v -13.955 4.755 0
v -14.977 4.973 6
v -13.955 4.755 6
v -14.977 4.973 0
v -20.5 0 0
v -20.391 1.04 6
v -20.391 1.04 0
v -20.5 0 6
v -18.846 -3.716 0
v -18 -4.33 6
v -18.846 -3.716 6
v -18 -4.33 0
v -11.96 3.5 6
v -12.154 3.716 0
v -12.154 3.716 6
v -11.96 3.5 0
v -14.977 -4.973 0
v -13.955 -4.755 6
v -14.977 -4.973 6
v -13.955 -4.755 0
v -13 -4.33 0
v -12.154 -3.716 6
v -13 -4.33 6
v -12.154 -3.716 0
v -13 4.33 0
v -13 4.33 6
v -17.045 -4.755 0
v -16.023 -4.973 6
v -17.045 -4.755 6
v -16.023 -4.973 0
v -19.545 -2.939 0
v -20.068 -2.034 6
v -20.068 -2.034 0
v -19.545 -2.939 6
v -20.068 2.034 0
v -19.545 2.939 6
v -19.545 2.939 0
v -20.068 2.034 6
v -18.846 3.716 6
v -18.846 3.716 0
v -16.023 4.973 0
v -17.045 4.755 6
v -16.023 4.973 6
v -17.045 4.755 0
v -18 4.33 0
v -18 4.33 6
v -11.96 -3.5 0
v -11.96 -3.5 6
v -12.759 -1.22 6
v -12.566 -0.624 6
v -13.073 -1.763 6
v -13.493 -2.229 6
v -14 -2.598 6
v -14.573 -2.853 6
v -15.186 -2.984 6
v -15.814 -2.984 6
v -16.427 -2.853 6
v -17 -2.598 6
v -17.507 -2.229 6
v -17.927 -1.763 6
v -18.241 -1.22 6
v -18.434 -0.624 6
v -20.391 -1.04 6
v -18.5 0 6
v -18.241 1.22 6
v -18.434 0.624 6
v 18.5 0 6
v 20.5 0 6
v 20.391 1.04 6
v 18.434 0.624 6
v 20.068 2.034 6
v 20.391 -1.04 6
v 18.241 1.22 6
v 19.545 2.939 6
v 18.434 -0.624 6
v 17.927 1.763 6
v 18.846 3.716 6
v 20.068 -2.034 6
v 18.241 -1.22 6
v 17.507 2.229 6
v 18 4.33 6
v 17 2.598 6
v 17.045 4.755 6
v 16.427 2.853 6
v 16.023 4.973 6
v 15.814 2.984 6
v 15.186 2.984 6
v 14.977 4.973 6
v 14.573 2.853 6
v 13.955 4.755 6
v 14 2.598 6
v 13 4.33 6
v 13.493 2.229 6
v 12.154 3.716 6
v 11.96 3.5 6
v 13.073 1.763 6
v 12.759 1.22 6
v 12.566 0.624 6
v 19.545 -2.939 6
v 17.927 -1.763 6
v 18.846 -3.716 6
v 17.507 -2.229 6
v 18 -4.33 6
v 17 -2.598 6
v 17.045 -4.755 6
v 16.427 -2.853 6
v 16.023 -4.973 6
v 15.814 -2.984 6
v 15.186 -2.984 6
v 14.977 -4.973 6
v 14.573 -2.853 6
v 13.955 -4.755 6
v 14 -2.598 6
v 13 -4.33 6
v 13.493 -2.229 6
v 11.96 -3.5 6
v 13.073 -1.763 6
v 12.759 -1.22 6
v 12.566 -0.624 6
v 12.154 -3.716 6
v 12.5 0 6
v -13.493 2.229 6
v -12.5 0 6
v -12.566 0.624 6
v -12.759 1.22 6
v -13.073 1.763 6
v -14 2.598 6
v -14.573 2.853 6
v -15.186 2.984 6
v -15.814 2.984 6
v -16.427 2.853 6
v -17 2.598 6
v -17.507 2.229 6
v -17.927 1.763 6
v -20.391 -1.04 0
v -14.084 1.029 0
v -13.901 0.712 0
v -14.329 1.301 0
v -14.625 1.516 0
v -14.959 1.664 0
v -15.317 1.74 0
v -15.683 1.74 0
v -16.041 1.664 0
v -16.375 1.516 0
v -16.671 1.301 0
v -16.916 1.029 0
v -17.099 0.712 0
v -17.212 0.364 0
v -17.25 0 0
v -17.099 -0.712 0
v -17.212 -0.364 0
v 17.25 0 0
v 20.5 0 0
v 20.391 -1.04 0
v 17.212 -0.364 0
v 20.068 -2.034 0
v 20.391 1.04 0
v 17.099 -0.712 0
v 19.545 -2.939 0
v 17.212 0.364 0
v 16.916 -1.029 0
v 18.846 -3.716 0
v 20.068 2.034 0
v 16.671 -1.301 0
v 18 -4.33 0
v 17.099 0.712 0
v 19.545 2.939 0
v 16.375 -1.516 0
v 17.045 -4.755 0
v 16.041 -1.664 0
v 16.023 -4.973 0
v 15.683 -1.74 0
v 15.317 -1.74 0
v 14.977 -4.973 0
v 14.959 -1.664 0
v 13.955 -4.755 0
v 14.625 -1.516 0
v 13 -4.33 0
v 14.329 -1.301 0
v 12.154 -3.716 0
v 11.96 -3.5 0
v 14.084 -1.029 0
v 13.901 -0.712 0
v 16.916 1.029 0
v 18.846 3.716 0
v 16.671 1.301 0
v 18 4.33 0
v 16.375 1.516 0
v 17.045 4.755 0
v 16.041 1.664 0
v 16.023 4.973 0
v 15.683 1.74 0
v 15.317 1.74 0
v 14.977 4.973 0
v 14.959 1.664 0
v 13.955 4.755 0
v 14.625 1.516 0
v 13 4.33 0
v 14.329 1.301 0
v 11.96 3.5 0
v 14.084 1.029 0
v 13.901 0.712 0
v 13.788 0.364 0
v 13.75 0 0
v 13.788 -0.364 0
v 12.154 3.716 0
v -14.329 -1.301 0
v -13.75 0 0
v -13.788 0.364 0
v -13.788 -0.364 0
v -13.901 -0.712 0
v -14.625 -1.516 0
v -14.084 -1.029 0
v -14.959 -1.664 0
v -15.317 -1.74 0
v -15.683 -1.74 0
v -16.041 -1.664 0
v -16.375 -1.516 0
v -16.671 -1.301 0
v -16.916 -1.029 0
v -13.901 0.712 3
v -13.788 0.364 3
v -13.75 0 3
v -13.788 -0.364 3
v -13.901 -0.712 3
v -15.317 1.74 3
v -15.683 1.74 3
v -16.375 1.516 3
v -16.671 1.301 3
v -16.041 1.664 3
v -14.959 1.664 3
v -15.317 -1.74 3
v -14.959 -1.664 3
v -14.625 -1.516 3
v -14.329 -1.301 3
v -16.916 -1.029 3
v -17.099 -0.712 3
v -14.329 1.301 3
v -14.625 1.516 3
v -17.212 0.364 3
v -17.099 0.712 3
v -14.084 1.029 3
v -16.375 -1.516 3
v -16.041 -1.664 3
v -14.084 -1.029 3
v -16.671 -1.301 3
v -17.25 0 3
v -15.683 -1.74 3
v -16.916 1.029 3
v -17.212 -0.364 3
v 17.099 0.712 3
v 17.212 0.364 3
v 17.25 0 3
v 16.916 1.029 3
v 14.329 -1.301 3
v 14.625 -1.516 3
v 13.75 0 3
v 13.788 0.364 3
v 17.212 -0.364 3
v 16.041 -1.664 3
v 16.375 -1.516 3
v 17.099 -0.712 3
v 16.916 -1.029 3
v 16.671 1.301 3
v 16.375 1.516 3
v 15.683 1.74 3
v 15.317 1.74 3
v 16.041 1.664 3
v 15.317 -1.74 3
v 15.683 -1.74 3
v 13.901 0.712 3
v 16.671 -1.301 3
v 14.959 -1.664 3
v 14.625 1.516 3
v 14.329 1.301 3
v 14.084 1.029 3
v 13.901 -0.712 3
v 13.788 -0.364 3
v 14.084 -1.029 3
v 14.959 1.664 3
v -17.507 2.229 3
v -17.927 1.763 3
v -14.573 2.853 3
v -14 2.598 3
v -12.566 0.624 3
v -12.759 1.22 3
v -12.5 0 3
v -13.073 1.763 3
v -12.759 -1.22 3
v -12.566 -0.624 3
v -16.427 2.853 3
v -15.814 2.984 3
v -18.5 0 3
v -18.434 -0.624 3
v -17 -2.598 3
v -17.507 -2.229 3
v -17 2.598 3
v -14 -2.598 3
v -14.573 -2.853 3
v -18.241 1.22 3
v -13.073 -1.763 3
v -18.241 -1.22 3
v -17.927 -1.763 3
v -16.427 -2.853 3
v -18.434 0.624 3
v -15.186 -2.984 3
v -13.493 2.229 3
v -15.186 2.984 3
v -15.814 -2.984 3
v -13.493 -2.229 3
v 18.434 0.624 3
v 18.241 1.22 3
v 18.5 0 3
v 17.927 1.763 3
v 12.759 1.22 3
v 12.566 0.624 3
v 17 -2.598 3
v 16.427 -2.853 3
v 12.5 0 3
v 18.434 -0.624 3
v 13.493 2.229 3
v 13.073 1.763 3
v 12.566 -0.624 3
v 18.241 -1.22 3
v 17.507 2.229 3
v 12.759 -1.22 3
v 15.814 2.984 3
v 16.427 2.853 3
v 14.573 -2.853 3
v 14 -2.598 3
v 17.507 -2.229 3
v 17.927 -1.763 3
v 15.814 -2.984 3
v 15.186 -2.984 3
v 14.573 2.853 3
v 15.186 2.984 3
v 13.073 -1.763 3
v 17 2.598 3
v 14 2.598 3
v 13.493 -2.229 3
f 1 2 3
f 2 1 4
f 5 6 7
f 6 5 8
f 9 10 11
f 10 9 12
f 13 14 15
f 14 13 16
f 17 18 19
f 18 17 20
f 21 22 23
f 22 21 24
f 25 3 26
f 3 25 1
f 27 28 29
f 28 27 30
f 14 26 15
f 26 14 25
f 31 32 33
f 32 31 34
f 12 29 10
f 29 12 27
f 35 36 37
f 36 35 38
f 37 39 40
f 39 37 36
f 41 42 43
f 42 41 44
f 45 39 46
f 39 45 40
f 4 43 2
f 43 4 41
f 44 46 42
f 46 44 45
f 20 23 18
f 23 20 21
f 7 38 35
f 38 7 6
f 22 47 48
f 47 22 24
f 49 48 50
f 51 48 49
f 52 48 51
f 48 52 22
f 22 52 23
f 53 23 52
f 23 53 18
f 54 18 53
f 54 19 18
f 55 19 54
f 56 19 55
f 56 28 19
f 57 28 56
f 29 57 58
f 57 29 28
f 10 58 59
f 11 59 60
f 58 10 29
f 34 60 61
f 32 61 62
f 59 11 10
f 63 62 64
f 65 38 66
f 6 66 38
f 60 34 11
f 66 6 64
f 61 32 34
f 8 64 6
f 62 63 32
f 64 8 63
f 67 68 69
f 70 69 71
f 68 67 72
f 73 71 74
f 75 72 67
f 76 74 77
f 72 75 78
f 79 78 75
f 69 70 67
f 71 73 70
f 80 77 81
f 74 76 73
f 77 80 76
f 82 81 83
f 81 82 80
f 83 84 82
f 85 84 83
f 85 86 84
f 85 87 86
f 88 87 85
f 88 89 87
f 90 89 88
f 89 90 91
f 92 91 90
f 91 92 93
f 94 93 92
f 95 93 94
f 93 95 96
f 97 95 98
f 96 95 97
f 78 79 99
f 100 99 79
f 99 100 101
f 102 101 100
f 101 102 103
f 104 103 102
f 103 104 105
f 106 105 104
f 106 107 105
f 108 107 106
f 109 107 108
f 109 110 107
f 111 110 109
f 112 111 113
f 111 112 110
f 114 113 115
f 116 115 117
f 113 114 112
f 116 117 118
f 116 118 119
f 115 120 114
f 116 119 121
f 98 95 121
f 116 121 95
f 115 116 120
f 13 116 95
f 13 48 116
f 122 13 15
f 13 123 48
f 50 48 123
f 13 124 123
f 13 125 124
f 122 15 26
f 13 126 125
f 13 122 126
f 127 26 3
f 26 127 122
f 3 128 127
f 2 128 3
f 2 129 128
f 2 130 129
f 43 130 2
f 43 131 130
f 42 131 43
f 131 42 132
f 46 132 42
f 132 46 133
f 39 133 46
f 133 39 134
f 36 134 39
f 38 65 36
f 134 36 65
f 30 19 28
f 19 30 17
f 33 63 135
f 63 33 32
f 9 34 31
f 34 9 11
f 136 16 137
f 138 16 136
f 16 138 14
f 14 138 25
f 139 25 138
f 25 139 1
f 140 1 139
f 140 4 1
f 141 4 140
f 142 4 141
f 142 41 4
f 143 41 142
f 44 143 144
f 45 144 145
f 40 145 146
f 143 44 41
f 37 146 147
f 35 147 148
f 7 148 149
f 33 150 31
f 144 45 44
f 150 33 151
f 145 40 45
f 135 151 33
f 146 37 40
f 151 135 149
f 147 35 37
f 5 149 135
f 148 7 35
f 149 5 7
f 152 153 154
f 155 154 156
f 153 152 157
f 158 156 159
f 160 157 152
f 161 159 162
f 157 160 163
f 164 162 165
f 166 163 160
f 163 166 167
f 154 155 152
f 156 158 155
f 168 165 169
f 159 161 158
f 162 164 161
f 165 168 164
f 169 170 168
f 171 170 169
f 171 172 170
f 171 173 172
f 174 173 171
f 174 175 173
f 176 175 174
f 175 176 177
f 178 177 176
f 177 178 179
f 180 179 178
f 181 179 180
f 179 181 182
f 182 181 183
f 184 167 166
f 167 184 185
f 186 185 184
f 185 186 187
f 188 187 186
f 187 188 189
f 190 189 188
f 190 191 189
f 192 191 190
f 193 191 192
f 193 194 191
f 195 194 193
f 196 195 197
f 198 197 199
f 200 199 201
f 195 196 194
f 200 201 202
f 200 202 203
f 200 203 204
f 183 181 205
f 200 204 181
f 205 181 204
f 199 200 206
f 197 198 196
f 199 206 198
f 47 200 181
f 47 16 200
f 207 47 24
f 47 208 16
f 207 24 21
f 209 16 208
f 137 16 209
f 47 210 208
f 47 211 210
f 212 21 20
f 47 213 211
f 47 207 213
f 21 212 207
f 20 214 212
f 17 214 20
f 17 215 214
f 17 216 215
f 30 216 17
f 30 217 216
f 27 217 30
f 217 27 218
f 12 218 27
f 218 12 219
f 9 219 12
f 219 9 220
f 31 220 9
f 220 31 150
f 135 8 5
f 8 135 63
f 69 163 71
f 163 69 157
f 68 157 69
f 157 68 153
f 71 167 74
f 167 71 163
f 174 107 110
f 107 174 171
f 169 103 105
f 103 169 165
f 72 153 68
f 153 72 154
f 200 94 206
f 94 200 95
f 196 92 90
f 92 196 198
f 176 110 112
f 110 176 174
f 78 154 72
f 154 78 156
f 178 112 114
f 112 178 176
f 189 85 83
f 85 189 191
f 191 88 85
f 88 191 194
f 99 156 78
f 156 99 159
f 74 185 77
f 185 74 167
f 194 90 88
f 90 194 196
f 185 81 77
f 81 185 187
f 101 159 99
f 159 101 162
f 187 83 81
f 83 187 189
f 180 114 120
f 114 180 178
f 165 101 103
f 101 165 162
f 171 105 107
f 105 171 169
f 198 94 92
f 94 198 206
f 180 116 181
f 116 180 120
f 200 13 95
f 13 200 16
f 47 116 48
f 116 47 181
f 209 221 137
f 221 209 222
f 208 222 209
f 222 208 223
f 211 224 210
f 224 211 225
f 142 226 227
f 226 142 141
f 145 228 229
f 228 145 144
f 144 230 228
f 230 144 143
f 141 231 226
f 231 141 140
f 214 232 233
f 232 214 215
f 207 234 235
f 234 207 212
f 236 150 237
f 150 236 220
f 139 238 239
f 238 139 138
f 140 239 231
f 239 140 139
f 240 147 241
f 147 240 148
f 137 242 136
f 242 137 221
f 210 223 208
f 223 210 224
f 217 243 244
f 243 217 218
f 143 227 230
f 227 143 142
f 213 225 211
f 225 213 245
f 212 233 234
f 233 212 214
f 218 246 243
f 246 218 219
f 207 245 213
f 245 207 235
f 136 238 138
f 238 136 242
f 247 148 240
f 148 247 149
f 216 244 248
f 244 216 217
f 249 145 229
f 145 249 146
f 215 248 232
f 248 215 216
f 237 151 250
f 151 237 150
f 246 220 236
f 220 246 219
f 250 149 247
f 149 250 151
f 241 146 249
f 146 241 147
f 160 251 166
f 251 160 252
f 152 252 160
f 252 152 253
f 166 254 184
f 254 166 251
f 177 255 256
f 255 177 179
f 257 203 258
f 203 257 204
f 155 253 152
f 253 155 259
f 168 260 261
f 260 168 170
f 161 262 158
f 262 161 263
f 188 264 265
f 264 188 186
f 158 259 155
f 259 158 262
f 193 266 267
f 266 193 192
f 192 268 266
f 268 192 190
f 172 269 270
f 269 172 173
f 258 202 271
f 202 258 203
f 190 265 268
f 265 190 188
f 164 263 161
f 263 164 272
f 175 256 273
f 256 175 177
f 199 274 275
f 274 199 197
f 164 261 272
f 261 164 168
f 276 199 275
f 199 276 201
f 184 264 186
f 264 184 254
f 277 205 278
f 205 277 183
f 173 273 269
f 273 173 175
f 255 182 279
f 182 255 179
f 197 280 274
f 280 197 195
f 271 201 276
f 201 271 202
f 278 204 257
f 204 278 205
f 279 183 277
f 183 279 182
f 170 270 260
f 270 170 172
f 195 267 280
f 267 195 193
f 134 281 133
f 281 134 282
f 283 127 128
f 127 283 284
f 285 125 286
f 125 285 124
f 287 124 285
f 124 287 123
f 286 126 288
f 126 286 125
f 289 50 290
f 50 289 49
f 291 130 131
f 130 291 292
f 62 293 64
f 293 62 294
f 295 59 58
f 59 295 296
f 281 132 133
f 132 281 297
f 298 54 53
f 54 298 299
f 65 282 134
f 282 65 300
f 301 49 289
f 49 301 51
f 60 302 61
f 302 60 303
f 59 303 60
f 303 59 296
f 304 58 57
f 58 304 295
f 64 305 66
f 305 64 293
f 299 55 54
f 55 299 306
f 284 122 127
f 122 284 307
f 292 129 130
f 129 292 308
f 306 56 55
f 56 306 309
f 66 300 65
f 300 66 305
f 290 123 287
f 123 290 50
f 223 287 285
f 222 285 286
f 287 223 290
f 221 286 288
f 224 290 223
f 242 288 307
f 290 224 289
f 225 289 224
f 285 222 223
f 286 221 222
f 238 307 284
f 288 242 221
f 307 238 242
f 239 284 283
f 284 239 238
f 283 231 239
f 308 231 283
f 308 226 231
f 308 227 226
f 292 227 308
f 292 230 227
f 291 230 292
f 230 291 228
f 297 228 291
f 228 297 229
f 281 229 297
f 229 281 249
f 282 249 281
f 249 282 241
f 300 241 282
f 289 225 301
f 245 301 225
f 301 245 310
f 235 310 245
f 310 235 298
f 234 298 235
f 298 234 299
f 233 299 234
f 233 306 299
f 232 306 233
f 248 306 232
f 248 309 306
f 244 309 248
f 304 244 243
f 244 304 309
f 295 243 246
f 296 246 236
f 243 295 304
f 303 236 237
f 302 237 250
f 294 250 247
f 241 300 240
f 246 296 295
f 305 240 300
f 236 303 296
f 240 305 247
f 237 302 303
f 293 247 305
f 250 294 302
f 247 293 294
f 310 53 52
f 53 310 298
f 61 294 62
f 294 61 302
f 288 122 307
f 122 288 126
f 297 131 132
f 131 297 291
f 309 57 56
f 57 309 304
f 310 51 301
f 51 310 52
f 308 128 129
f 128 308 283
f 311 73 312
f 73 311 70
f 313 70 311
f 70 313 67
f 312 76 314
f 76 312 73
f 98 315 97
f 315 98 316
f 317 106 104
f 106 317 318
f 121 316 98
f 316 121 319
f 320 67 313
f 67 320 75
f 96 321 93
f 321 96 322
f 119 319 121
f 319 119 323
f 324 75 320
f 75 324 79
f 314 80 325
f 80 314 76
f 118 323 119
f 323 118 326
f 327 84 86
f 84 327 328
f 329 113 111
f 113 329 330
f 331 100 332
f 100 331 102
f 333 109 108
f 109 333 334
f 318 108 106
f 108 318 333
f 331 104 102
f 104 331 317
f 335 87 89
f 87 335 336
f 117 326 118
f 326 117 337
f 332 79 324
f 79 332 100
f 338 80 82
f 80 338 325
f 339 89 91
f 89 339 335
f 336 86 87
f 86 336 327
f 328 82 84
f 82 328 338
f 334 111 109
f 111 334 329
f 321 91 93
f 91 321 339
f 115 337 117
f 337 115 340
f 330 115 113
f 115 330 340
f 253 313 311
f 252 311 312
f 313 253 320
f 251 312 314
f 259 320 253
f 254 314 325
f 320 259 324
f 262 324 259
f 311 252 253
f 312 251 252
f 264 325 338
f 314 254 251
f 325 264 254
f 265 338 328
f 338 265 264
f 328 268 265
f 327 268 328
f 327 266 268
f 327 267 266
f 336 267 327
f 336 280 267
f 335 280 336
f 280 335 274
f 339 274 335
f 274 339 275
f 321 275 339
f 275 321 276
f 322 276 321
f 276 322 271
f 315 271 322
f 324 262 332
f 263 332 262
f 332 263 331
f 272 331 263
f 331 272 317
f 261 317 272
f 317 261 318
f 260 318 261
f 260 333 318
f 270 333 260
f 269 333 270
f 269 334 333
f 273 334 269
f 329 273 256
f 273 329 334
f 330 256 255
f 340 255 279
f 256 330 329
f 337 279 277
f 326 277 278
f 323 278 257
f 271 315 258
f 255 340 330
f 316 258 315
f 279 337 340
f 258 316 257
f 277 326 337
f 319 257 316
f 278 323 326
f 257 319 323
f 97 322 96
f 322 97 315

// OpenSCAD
// File: extruder-force-sensor.scad
// Author: Mark Heywood alias Airtripper
// Airtripper Extruder Filament Force Sensor Bracket
// by Airtripper May 2013
// Copyright © 2013 Airtripper
// http://www.airtripper.com
// Licensed Attribution-NonCommercial-ShareAlike 3.0 Unported. 
// Last edit: 12/09/2013


//++++++++++++++ Select Part To View ++++++++++++++++++

//-- Select Part To View --//

view_part = 10;	// [0:nothing, 1:assembled, 2:load_cell, 3:bowden_bracket, 4:load_cell_bracket, 5:bottom_stepper_bracket, 6:top_stepper_bracket, 7:full_load_cell_bracket, 8:extruder, 9:idler, 10:strut, 11:axle, 12:tube_bracket]

//-- END Select Part To View --//


//----------------------------------------------------------
//--------------- START CONFIGURATION ----------------------
//----------------------------------------------------------

fd = 2.30;		// Filament size for bracket

//------ START Load Cell Configuration-------//

lcl = 80;		// (80) Load cell length
lch = 12.7;		// (12.7) Load cell height
lcw = 12.7;		// (12.7) Load cell width
lclhs = 4;		// (4) Left side screw holes size - screws 1 & 2 (load cell bracket side)
lcrhs = 4;		// (4) Right side screw holes size (load cell stepper bracket side)
lchle = 5;		// (5) Measure from left edge to center of first screw hole (load cell bracket side)
lchln = 15;		// (15) Measure from first screw hole center to second screw hole center (load cell bracket side)
lchcd = 40;		// (40) Measure distance between the second & third hole centers
lchrc = 15; 	// (15) Measure distance between the center of the third and fourth screw hole (load cell stepper bracket side)

//----- END Load Cell Configuration -----//




//---- START Load Cell Bracket Configuration ----//

// Configuration for part 4:load_cell_bracket
lcbhs = 4.5;	// (4.5) Bracket screw hole size for load cell attachment
lcbfh = 8;		// (8) Bracket screw hole size for attachment to printer
lcbss = 46;		// (46) Bracket fixing screw holes distance apart, hole center to hole center
lcbbss = 4.5;	// (4.5) Bowden bracket attachment screw size
lcbbssh = 8.4;	// (8.4) Bowden bracket attachment screw Hex head size

//-- END Load Cell Bracket Configuration--//




//---- START Stepper Motor Bottom Bracket Configuration----//

// Configuration for part 5:bottom_stepper_bracket
smw = 44;	// NEMA 17 stepper motor case width

// Stepper motor bottom bracket load cell attachment acrew size
sbsd = 3.5;		// (M3 = 3.5)(M4 = 4.5) Screw size
sbsdh = 7.5;	// (M3 = 7.5)(M4 = 8.8) Screw Hex head size

//-- END Stepper Motor Botton Bracket Configuration --//




//---- START Stepper Motor Top Bracket Configuration----//

// Configuration for part 6:top_stepper_bracket
// Stepper motor Top bracket load cell attachment acrew size
stbsd = 3.5;		// (M3 = 3.5)(M4 = 4.5) Screw size
stbsdh = 7.5;	// (M3 = 7.5)(M4 = 8.8) Screw Hex head size

//-- END Stepper Motor Top Bracket Configuration --//


//----------------------------------------------------------
//---------------- END CONFIGURATION -----------------------
//----------------------------------------------------------

//++++++++++++++++++++ Model View, Positioning and Rotation ++++++++++++++++++++

if (view_part == 1) {	// Assembled view
	translate([45.5+lchle,-3+(lcw-12.7),44]) rotate([90,0,-90]) extruder();
	//translate([lchle+lchln+lchcd-7.5,-(smbw/2)-9.25+(lcw/2),lch]) rotate([0,0,0]) bottom_stepper_bracket();
	//translate([25+lchle+lchln+lchcd-7.5,-(smbw/2)-9.25+(lcw/2),18+lch]) rotate([0,-90,0]) top_stepper_bracket();
	//translate([0,0,0]) rotate([0,0,0]) load_cell();
	//translate([21+lchle,26+(lcw/2),-42]) rotate([0,-90,90]) load_cell_bracket();
	//translate([21+lchle,-2.7+(lcw-12.7),-22]) rotate([0,-90,90]) bowden_bracket();
}
if (view_part == 2) {
	translate([0,0,0]) rotate([0,0,0]) load_cell();
}

if (view_part == 3) {
	translate([-55,-5,32]) rotate([-90,0,0]) bowden_bracket();
}

if (view_part == 4) {
	translate([(-20-lcbss)/2,-17.5,32]) rotate([-90,0,0]) load_cell_bracket();
}

if (view_part == 5) {
	translate([30,-12.5,0]) rotate([0,0,90]) bottom_stepper_bracket();
}

if (view_part == 6) {
	translate([30,-20,0]) rotate([0,0,90]) top_stepper_bracket();
}
if (view_part == 7) {
	translate([-66,-23,32]) rotate([-90,0,0]) load_cell_bracket();
	translate([-46,12,32]) rotate([-90,0,0]) bowden_bracket();
	translate([-46,8,0]) color("red") cube([4,3,32]);	// fill bracket hook joint
	//%translate([-67,-20,0]) cube([134,40,50]);	// Centering guide box
}
if (view_part == 8) {
	translate([0,0,0]) rotate([0,0,-90]) extruder();
}
if (view_part == 9) {
	translate([0,0,0]) rotate([0,0,0]) idler();
}
if (view_part == 10) {
	translate([0,0,0]) rotate([0,0,0]) strut();
}
if (view_part == 11) {
	translate([0,0,0]) rotate([0,0,0]) axle();
}
if (view_part == 12) {
	translate([15,-15,0]) rotate([0,0,90]) tube_bracket();
}

//+++++++++++++ END - Model View, Positioning and Rotation +++++++++++++++++

//######################### Bowden Bracket ##########################

//bowden_bracket();

module bowden_bracket() {
	difference() {
		union() {
			difference() {
				union() {
					// Main bracket body and logo
					translate([0,0,0]) color("red") cube([95,32,9]);
					translate([52,18,8]) rotate([0,0,180]) scale([0.6,0.6,1]) airtripper();
					translate([52,18.25,7.5]) rotate([0,0,180]) scale([0.6,0.6,1]) airtripper();
					// bracket attachment hook
					translate([0,0,-2.5]) color("red") cube([3,32,3]);
				}
				// Make the rounded curve on the right edge of the bracket
				translate([67,-90,-1]) rotate([0,0,0]) color("red") cylinder(15, r=100, $fn=500);
			}
			// Add push fit module and supports
			translate([97,6,-2]) rotate([90,0,0]) bsp_push_fit();
			translate([97,-6,-2]) rotate([0,0,10]) color("red") cube([5,37,14]);
			translate([100.2,5,-2]) rotate([0,0,22]) color("red") cube([5,25,14]);
			difference() {
				union() {
					// Support flange
					translate([71,29,-2]) rotate([0,0,0]) color("red") cube([25,3,14]);
				}
				translate([60,28,-8]) rotate([0,25,0]) color("red") cube([21,5,14]);
				translate([65,28,4]) rotate([0,-25,0]) color("red") cube([21,5,14]);
				
			}
		}
		// Bowden bracket screw holes
		translate([10,6,-1]) rotate([0,0,0])color("red") cylinder(50, r=lcbbss/2, $fn=100);
		translate([10,26,-1]) rotate([0,0,0])color("red") cylinder(50, r=lcbbss/2, $fn=100);
	}
}



//###################### Load Cell Bracket ################################

//load_cell_bracket();

module load_cell_bracket() {
	difference() {
		union() {
			// Bracket main body
			translate([0,0,0]) color("red") cube([20+lcbss,32,10]);	// Back plate
			translate([20,0,0]) color("red") cube([20,32,35]);	// Load cell attachment block
			translate([40,0,0]) color("red") cube([5,32,25.5-(lcw/2)]);	// Load cell edge guide
			difference() {
				translate([40,21-lchln-lclhs,0]) color("red") cube([2,50,35]);	// Load cell spacer
				translate([39,-32,-1]) color("red") cube([4,32,37]);	// Load cell spacer -y edge chop
				translate([39,32,-1]) color("red") cube([4,60,37]);	// Load cell spacer +y edge chop
			}
			translate([21,0,0]) rotate([0,-45,0]) color("red") cube([10,32,10]);	// Bottom inner corner bevel
			translate([44,0,0]) rotate([0,-45,0]) color("red") cube([10,32,10]);	// Top inner corner bevel
		}
			// Bracket screw holes for printer attachment
			translate([10,16,-1]) color("red") cylinder(12, r=lcbfh/2, $fn=100);	// Bottom hole
			translate([10+lcbss,16,-1]) color("red") cylinder(12, r=lcbfh/2, $fn=100);	// Top hole
			// Screw hole for load cell attachment
			translate([10,21,26]) rotate([0,90,0])color("red") cylinder(50, r=lcbhs/2, $fn=100);
			// Screw holes for attaching bowden feed bracket
			translate([30,6,-1]) rotate([0,0,0])color("red") cylinder(50, r=lcbbss/2, $fn=100);
			translate([30,26,-1]) rotate([0,0,0])color("red") cylinder(50, r=lcbbss/2, $fn=100);
			translate([30,6,-1]) rotate([0,0,0])color("red") cylinder(10, r=lcbbssh/2, $fn=6);	// Hex screw head
			translate([30,26,-1]) rotate([0,0,0])color("red") cylinder(10, r=lcbbssh/2, $fn=6);	// Hex screw head
			// Anchor point for bowden bracket
			translate([19,-1,32]) color("red") cube([4,34,4]);
	}
}



//######################## Stepper Motor Bracket ##################################

//Top Stepper Motor Bracket

smbwa = 2.5;	// default 2.5 - For adjusting stepper motor clamp side thickness
smbw = 17+smw+(smbwa*2);	// default 17

//top_stepper_bracket();

module top_stepper_bracket() {
	difference() {
		// Main bracket body
		translate([0,0,0]) color("yellow") cube([40,smbw,25]);
		translate([-2.5,8.5+smbwa,-1]) color("yellow") cube([36,smw,27]);
		translate([8,-1,-1]) color("yellow") cube([36,6+(smbwa/2),27]);
		translate([8,smbw-5-(smbwa/2),-1]) color("yellow") cube([36,6+(smbwa/2),27]);
		// Bracket screw holes to clamp stepper motor
		translate([-1,4.25+(smbwa/2),5]) rotate([0,90,0]) color("yellow") cylinder(10, r=stbsd/2, $fn=50);
		translate([-1,4.25+(smbwa/2),20]) rotate([0,90,0]) color("yellow") cylinder(10, r=stbsd/2, $fn=50);
		translate([-1,smbw-4.25-(smbwa/2),5]) rotate([0,90,0]) color("yellow") cylinder(10, r=stbsd/2, $fn=50);
		translate([-1,smbw-4.25-(smbwa/2),20]) rotate([0,90,0]) color("yellow") cylinder(10, r=stbsd/2, $fn=50);
		// Hex nut capture sockets
		translate([6,4.25+(smbwa/2),5]) rotate([0,90,0]) color("yellow") cylinder(10, r=stbsdh/2, $fn=6);
		translate([6,4.25+(smbwa/2),20]) rotate([0,90,0]) color("yellow") cylinder(10, r=stbsdh/2, $fn=6);
		translate([6,smbw-4.25-(smbwa/2),5]) rotate([0,90,0]) color("yellow") cylinder(10, r=stbsdh/2, $fn=6);
		translate([6,smbw-4.25-(smbwa/2),20]) rotate([0,90,0]) color("yellow") cylinder(10, r=stbsdh/2, $fn=6);
		// Holes in the side and top of bracket
		translate([33,20+smbwa,12.5]) rotate([0,90,0]) color("yellow") cylinder(10, r=5, $fn=100);	// Top
		translate([33,40+smbwa,12.5]) rotate([0,90,0]) color("yellow") cylinder(10, r=5, $fn=100);	// Top
		translate([29,-1,12.5]) rotate([-90,0,0]) color("yellow") cylinder(62+smbwa, r=3, $fn=100);	// Side
		//translate([18,-1,12.5]) rotate([-90,0,0]) color("yellow") cylinder(62, r=3, $fn=100);	// Side
		
	}
}

//Bottom Stepper Motor Bracket

//bottom_stepper_bracket();

module bottom_stepper_bracket() {

	difference() {
		union() {
			translate([0,0,0]) color("yellow") cube([25,smbw,15]);
			translate([10,(smbw/2)+9.25-6,0]) color("yellow") cube([lchrc+lchle,12,10]);
		}
		translate([-1,8.5+smbwa,10]) color("yellow") cube([27,smw,10]);
		// Stepper bracket clamp screw holes
		translate([5,4.25+(smbwa/2),-1]) color("yellow") cylinder(20, r=stbsd/2, $fn=50);
		translate([20,4.25+(smbwa/2),-1]) color("yellow") cylinder(20, r=stbsd/2, $fn=50);
		translate([5,smbw-4.25-(smbwa/2),-1]) color("yellow") cylinder(20, r=stbsd/2, $fn=50);
		translate([20,smbw-4.25-(smbwa/2),-1]) color("yellow") cylinder(20, r=stbsd/2, $fn=50);
		// Bracket and load cell attachment screw holes
		translate([7.5,(smbw/2)+9.25,-15]) color("black") cylinder(30, r=sbsd/2, $fn=50);
		translate([7.5+lchrc,(smbw/2)+9.25,-15]) color("black") cylinder(30, r=sbsd/2, $fn=50);
		translate([7.5,(smbw/2)+9.25,5]) color("yellow") cylinder(6, r=sbsdh/2, $fn=6);
		translate([7.5+lchrc,(smbw/2)+9.25,5]) color("yellow") cylinder(6, r=sbsdh/2, $fn=6);
		
	}
	//translate([12.5,30,-15]) color("black") cylinder(15, r=1.75, $fn=50);
}



//##################################################################
//################## EXTRA MODULE SECTION ##########################
//##################################################################


//####### BSP Push Fit Fitting Bracket for Bowden Bracket ##########

//bsp_push_fit();


module bsp_push_fit() {
	bsp = 10;
	x_nuj = 0;
	
	difference() {
		union() {
			//translate([0,3,0]) cube([3,11,26]);
			difference() {
				translate([3+x_nuj-3,7,15]) rotate([0,90,0]) cylinder(12+3, r=(bsp/2)+5.5, $fn=100);
				translate([11+x_nuj-3,7,19.5]) rotate([0,90,0]) cylinder(15+3, r=1.5, $fn=50);
			}
			difference() {
				translate([3+x_nuj,0,-5]) cube([12,14,18]);
				translate([2+x_nuj,-1,-7]) rotate([0,50,0]) cube([10,16,26]);
			}
		}
		translate([8+x_nuj,7,15]) rotate([0,90,0]) cylinder(8, r=(bsp/2), $fn=100);
		translate([-1,7,15]) rotate([0,90,0]) cylinder(19, r1=fd/2, $fn=30);
		translate([-1,7,15]) rotate([0,90,0]) cylinder(4, r1=fd+0.2, r2=fd/2, $fn=30);
		translate([11.2+x_nuj,7,-1]) rotate([0,0,0]) cylinder(15, r=1.75, $fn=50);	// M3 Screw hole
		translate([11.2+x_nuj,7,7]) rotate([0,0,30]) cylinder(5, r=3.5, $fn=6);	// M3 Screw hex nut hole
		translate([11.2+x_nuj,5.3,-1]) cube([6,3.4,15]);
		translate([11.2+x_nuj,7,-4]) rotate([0,0,0]) cylinder(5, r=3.5, $fn=50);
		translate([11.2+x_nuj,7,0.99]) rotate([0,0,0]) cylinder(3, r1=3.5, r2=1.75, $fn=50);
	}
}


// ################### Airtripper Bowden Extruder Body ##############################

// Revision 3b

module extruder() {
	difference() {
		union() {
			// Extruder base
			translate([0,0,1.5]) cube([42,42,3], center = true);

			// Bearing supports between screw columns and shaft bearing
			rotate([0,0,45]) translate([0,11,13]) cube([3,22,26], center = true);
			rotate([0,0,315]) translate([0,-11,13]) cube([3,22,26], center = true);
			difference() {
				translate([-3,0,22]) cylinder(8,r1=4, r2=4, $fn=50, center = true);
				rotate([0,90,0]) translate([-17,0,-10]) cylinder(8,r=4, $fn=50);
			}
			difference() {
				translate([0,0,3]) cylinder(22,r1=13.5, r2=6.3, $fn=100);	// rev. 3
				rotate([0,0,45]) translate([8,0,13]) cube([15,30,26.5], center = true);	// rev. 3
				rotate([0,0,315]) translate([8,0,13]) cube([15,30,26.5], center = true);	// rev. 3
			}
			// M3 Screw columns for stepper attachment
			translate([-15.5,15.5,0]) cylinder(26,r=4, $fn=50);	// rev. 3
			translate([-15.5,15.5,18]) cylinder(8,r1=4,r2=6, $fn=50);	// rev. 3
			translate([-15.5,-15.5,0]) cylinder(23.5,r=4, $fn=50);	// rev. 3
			translate([-15.5,-15.5,17.5]) cylinder(6,r1=4,r2=5, $fn=50);	// rev. 3
			translate([15.5,-15.5,3]) cylinder(1.5,r=3.5, $fn=50);	// rev. 3

		}
		union() {
			// Stepper shaft, gear insert and bearing cut-out
			translate([0,0,9.8]) cylinder(20,r1=13, r2=5, $fn=50, center = true);	// rev. 3
			translate([0,0,22]) cylinder(5,r=5, $fn=50, center = true);
			translate([0,0,27]) cylinder(8	,r=4, $fn=50, center = true);
			translate([0,0,25.5]) cylinder(2,r1=5, r2=4, $fn=50, center = true);
			translate([0,0,10.5]) cylinder(8	,r=7, $fn=100);	// rev. 2
			translate([0,0,18.5]) cylinder(3.5,r1=7, r2=3.5, $fn=50);	// rev. 2

			// Reduce wall and screw shaft for strut placement
			translate([-15.5,-15.5,23.5]) cylinder(5,r=3, $fn=30);
			translate([-12.5,-15.5,25.5]) cube([12,9,4], center = true);
			translate([-11.4,-11.4,27.9]) rotate([25,0,315]) cube([5,10,5], center = true);

			// M3 screw holes
			for(r=[1:4]) {
				rotate([0,0,r*360/4]) translate([15.5,15.5,-1]) cylinder(40,r=1.75, $fs=.1);
			}
			translate([-15.5,15.5,22.1]) cylinder(4,r=3.3, $fn=30);	// rev. 3
			translate([15.5,15.5,1.5]) cylinder(4,r=3.25, $fs=.1);	// rev. 3
		}
	}
	// Filament in-feed bracket
	difference() {
		union() {
			translate([8.75,-20,3]) rotate([0,0,90]) infeed_block();	// rev. 3
			translate([-12,-17,3]) rotate([0,0,-12]) cube([14,2,16]);	// rev. 3
		}

	}
	// Bowdon out-feed tube holder
	difference() {
		union() {
			translate([4.8,14,13]) cube([8,14,26], center = true);
			translate([-5.5,12.5,13]) cube([13.5,3,26], center = true);	// rev. 3
			translate([3.3,21.1+1.5,13]) cube([11,6,26], center = true);	// rev. 3
		}
		union() {
			// Tube and filament holes
			translate([4.8,24+15,15]) rotate([90,0,0]) cylinder(40, r=1.15, $fn=25);	// rev. 2, 3
			translate([5.3,16,15]) rotate([90,0,5]) cylinder(10, r1=0.4, r2=3, $fn=25);	// rev. 3

			// Insert and idler clearance
			translate([0,0,9.9]) cylinder(20,r1=13, r2=5, $fn=50, center = true);	// rev. 3

			// M3 bolt holes for idler preloader
			translate([3,17,20.5]) rotate([0,90,12]) cylinder(10, r=2.75, $fn=25);	// rev. 3
			translate([3,17,9.5]) rotate([0,90,12]) cylinder(10, r=2.75, $fn=25);	// rev. 3
			translate([-0.5,17,20.5]) rotate([0,90,0]) cylinder(10, r=2, $fn=25);
			translate([-0.5,17,9.5]) rotate([0,90,0]) cylinder(10, r=2, $fn=25);

			// just a hole
			translate([-3.5,15.5,9.5]) rotate([90,0,0]) cylinder(6, r=3.5, $fn=25);	// rev. 3
			translate([-3.5,15.5,20.5]) rotate([90,0,0]) cylinder(6, r=3.5, $fn=25);	// rev. 3

			// Bowden filament guide in-feed Cut off
			translate([11,7.5,14]) rotate([0,0,35]) cube([8,4,28], center = true);	// rev. 3
			translate([4.5,8.5,25]) cube([10,4,10], center = true);	// rev. 3
		}
	}
	
}


// ########### Filament infeed pipe design module for the Airtripper Bowden Extruder ###############

//infeed_block();

infeed_choice = 2;

module infeed_block() {

	if (infeed_choice == 1) {
		difference() {
			union() {
				 polyhedron(
				  points=[ [0,0,0],[0,8,0],[2,8,0],[2,0,0], // the six points at base
							[-5,0,8],[-5,8,8],[7,0,8],[7,8,8],
							[-5,0,16],[-5,8,16],[7,0,16],[7,8,16]
							],
							
				  triangles=[ [0,3,1],[2,1,3],
							[4,0,1],[1,5,4],[7,2,3],[7,3,6],
							[1,2,5],[2,7,5],[4,6,0],[6,3,0],
							[11,9,5],[5,7,11],[10,11,7],[7,6,10],
							[5,9,8],[8,4,5],[4,8,10],[10,6,4],[8,9,11],[11,10,8]
							]          // each triangle side
													 // two triangles for square base
				 );
			}
			translate([8,4,12]) rotate([0,-90,0]) cylinder(22, r=1.3, $fn=60);
			translate([-1,4,12]) rotate([0,-90,0]) cylinder(5, r1=1.3, r2=2.2, $fn=60);
			
		}
	}


	if (infeed_choice == 2) {
		difference() {
			union() {
				 polyhedron(
				  points=[ [-3,0,-3],[-3,8,-3],[2,8,-3],[2,0,-3], // the six points at base
							[-12,0,6],[-12,8,6],[7,0,8],[7,8,8],
							[-5,0,16],[-5,8,16],[7,0,16],[7,8,16]
							],
							
				  triangles=[ [0,3,1],[2,1,3],
							[4,0,1],[1,5,4],[7,2,3],[7,3,6],
							[1,2,5],[2,7,5],[4,6,0],[6,3,0],
							[11,9,5],[5,7,11],[10,11,7],[7,6,10],
							[5,9,8],[8,4,5],[4,8,10],[10,6,4],[8,9,11],[11,10,8]
							]          // each triangle side
													 // two triangles for square base
				 );
				translate([-2,4,12]) rotate([0,-90,0]) cylinder(10, r=5.9, $fn=100);
				translate([1,4,12]) rotate([0,-90,0]) cylinder(3, r1=4, r2=5.9, $fn=100);
			}
			translate([8,4,12]) rotate([0,-90,0]) cylinder(22, r=1.3, $fn=25);
			translate([-2.9,4,12]) rotate([0,-90,0]) cylinder(12, r=2.15, $fn=60);
			translate([0,4,12]) rotate([0,-90,0]) cylinder(3, r1=1.3, r2=2.15, $fn=60);
		}
	}

}


// #################### Extruder Idler######################################

//idler();

module idler() {
	difference() {
		union() {
			difference() {
				translate([0,0,7]) cube([22,42,14], center = true);
				// Bearing housing
				//#translate([-6,0,8]) cube([10,50,20], center = true);
				translate([0,0,1]) cube([10,24,10], center = true);
				translate([-5,0,6]) rotate([0,90,0]) cylinder(10,r=12, $fn=60);
			}
			// Axle spacer
			translate([-8,0,6]) rotate([0,90,0]) cylinder(16,r=6, $fn=40);
			translate([0,0,3]) cube([16,12,6], center = true);
		}
		union() {
			// Bearing axle cut-out
			translate([-7.75,0,6]) rotate([0,90,0]) cylinder(15.5,r=4.25, $fn=40);
			translate([0,0,2]) cube([14.2,8.5,8], center = true);
			translate([-4.5,0,0]) rotate([0,20,0]) cube([6,8.5,8], center = true);
			translate([4.5,0,0]) rotate([0,-20,0]) cube([6,8.5,8], center = true);
			translate([-3.7,0,6]) rotate([0,90,0]) cylinder(7.4,r=12, $fn=60);
			// hook
			translate([-12,-15.5,6]) rotate([0,90,0]) cylinder(24,r=2, $fn=25);
			translate([0,-18.5,11]) cube([24,10,10], center = true);
			translate([9.5,-17,1]) cube([4,16,16], center = true);
			translate([-9.5,-17,1]) cube([4,16,16], center = true);
			translate([0,-21,0]) rotate([45,0,0]) cube([24,6,10], center = true);
			translate([-11,-12,9.6]) rotate([0,135,0]) cube([4,6,6], center = true);
			translate([11,-12,9.6]) rotate([0,45,0]) cube([4,6,6], center = true);
			// Bolt slots
			translate([6,20,7]) cube([3.5,10,16], center = true);
			translate([-6,20,7]) cube([3.5,10,16], center = true);
			translate([0,24,7]) rotate([154,0,0]) cube([24,10,26], center = true);
			translate([0,26.5,25]) rotate([145,0,0]) cube([24,10,26], center = true);
			translate([0,25.5,7]) cube([22,10,16], center = true);
			//Padding
			//translate([-9,-17,7]) cube([6,10,16], center = true);
		}
	}

}

// ###################### Extruder Strut ###################################

//strut();

module strut() {

	difference() {
		union() {
			translate([-15.5,0,0]) color("red") cylinder(6, r=5, $fn=30);
			translate([15.5,0,0]) color("red") cylinder(6, r=5, $fn=30);
			translate([-15.5,-3.5,0]) color("red") cube([31,7,6]);
		}
		union() {
			// Screw holes
			translate([-15.5,0,-1]) color("red") cylinder(5, r=1.75, $fn=30);
			translate([15.5,0,-1]) color("red") cylinder(5, r=1.75, $fn=30);
			translate([-15.5,0,3]) color("red") cylinder(5, r=3, $fn=30);
			translate([15.5,0,3]) color("red") cylinder(5, r=3, $fn=30);
		}
	}
}

// ################### Extruder Idler Axle ##################################

// axle();

module axle() {
	cylinder(14.25,r=3.80, $fn=40);
	// Support flange while printing
//	translate([-5,-0.5,0]) cube([10,1,0.5]);
//	translate([-0.5,-5,0]) cube([1,10,0.5]);
//	difference() {
//		cylinder(0.5,r=10, $fn=40);
//		translate([0,0,-1]) cylinder(3,r=5, $fn=40);
//	}
}

// ######################## 4mm Tube Bracket #################################

//tube_bracket();


module tube_bracket() {
		difference() {
			union() {
				translate([0,10,0]) cube([30,10,10]);	// Pipe bracket
				difference() {
					translate([5,0,0]) cube([10,30,3]);	// Screw bracket
					difference() {
						translate([10,15,-1]) rotate([0,0,0]) cylinder(5, r=20, $fn=100);
						translate([10,15,-1]) rotate([0,0,0]) cylinder(5, r=15, $fn=100);
					}
				}
			}
			translate([-1,15,5]) rotate([0,90,0]) cylinder(32, r=1.15, $fn=60);	// filament tube hole
			translate([-0.95,15,5]) rotate([0,90,0]) cylinder(11, r=2.14, $fn=60);	// Pipe hole infeed
			translate([20,15,5]) rotate([0,90,0]) cylinder(11, r=2.11, $fn=60);	// Pipe hole outfeed
			translate([10,15,5]) rotate([0,90,0]) cylinder(5, r1=2.2, r2=1.3, $fn=60);	// Infeed hole taper
			translate([10,25,-1]) rotate([0,0,0]) cylinder(5, r=2.2, $fn=60);	// Screw holes
			translate([10,5,-1]) rotate([0,0,0]) cylinder(5, r=2.2, $fn=60);	// Screw holes
			translate([-7,4.4,9]) rotate([0,0,45]) cube([15,15,5]);	// Pipe bracket direction mark
			difference() {
				translate([10,4.4,9]) rotate([0,0,0]) cube([25,25,7]);	// Pipe bracket direction mark
				translate([19.4,4.4,9]) rotate([0,0,45]) cube([15,15,5]);	// Pipe bracket direction mark
				translate([0,4.4,9]) rotate([0,0,0]) cube([25,25,7]);	// Pipe bracket direction mark
			}
		}
}


// ################### Airtripper Logo #############################


// Module names are of the form poly_<inkscape-path-id>().  As a result,
// you can associate a polygon in this OpenSCAD program with the corresponding
// SVG element in the Inkscape document by looking for the XML element with
// the attribute id="inkscape-path-id".

// fudge value is used to ensure that subtracted solids are a tad taller
// in the z dimension than the polygon being subtracted from.  This helps
// keep the resulting .stl file manifold.
fudge = 0.1;

module poly_path3058(h)
{
  scale([25.4/90, -25.4/90, 1]) union()
  {
    linear_extrude(height=h)
      polygon([[-161.015630,25.769530],[-161.015630,-25.769530],[-150.609380,-25.769530],[-150.609380,25.769530]]);
  }
}

module poly_path3066(h)
{
  scale([25.4/90, -25.4/90, 1]) union()
  {
    linear_extrude(height=h)
      polygon([[7.031250,25.769530],[7.031250,-25.769530],[17.437500,-25.769530],[17.437500,25.769530]]);
  }
}

module poly_path3074(h)
{
  scale([25.4/90, -25.4/90, 1]) union()
  {
    difference()
    {
       linear_extrude(height=h)
         polygon([[171.632810,25.769530],[171.632810,-25.769530],[193.535150,-25.769530],[200.667449,-25.422325],[205.541010,-24.380860],[207.319672,-23.551365],[208.911584,-22.451626],[210.316743,-21.081641],[211.535150,-19.441410],[212.519501,-17.602275],[213.222616,-15.635715],[213.785150,-11.320320],[213.571988,-8.546250],[212.932577,-6.024881],[211.866915,-3.756212],[210.375000,-1.740240],[208.458960,-0.025258],[206.121060,1.340348],[203.361300,2.356577],[200.179680,3.023430],[203.260224,5.088880],[205.751950,7.347650],[208.331507,10.617194],[211.675780,15.714840],[217.968750,25.769530],[205.523430,25.769530],[198.000000,14.554680],[192.515620,6.978510],[190.995092,5.660166],[189.386710,4.833980],[187.250956,4.398935],[184.148430,4.253900],[182.039060,4.253900],[182.039060,25.769530]]);
       translate([0, 0, -fudge])
         linear_extrude(height=h+2*fudge)
           polygon([[182.039060,-3.972660],[189.738280,-3.972660],[195.820287,-4.130841],[199.089840,-4.605470],[200.750946,-5.466779],[202.007810,-6.785160],[202.798799,-8.525371],[203.062500,-10.652350],[202.715301,-13.003390],[201.673820,-14.853520],[199.999483,-16.158661],[197.753900,-16.875000],[190.160150,-17.050780],[182.039060,-17.050780]]);
    }
  }
}

module poly_path3056(h)
{
  scale([25.4/90, -25.4/90, 1]) union()
  {
    difference()
    {
       linear_extrude(height=h)
         polygon([[-166.253910,25.769530],[-177.574220,25.769530],[-182.074220,14.062500],[-202.675790,14.062500],[-206.929690,25.769530],[-217.968750,25.769530],[-197.894540,-25.769530],[-186.890630,-25.769530]]);
       translate([0, 0, -fudge])
         linear_extrude(height=h+2*fudge)
           polygon([[-185.414070,5.378900],[-192.515630,-13.746100],[-199.476570,5.378900]]);
    }
  }
}

module poly_path3060(h)
{
  scale([25.4/90, -25.4/90, 1]) union()
  {
    difference()
    {
       linear_extrude(height=h)
         polygon([[-140.695320,25.769530],[-140.695320,-25.769530],[-118.792970,-25.769530],[-111.660671,-25.422325],[-106.787110,-24.380860],[-105.008449,-23.551365],[-103.416540,-22.451626],[-102.011381,-21.081641],[-100.792970,-19.441410],[-99.808623,-17.602275],[-99.105507,-15.635715],[-98.542970,-11.320320],[-98.756133,-8.546250],[-99.395547,-6.024881],[-100.461213,-3.756212],[-101.953130,-1.740240],[-103.869168,-0.025258],[-106.207065,1.340348],[-108.966822,2.356577],[-112.148440,3.023430],[-109.067905,5.088880],[-106.576180,7.347650],[-103.996619,10.617194],[-100.652350,15.714840],[-94.359380,25.769530],[-106.804690,25.769530],[-114.328130,14.554680],[-119.812500,6.978510],[-121.333027,5.660166],[-122.941410,4.833980],[-125.077171,4.398935],[-128.179690,4.253900],[-130.289070,4.253900],[-130.289070,25.769530]]);
       translate([0, 0, -fudge])
         linear_extrude(height=h+2*fudge)
           polygon([[-130.289070,-3.972660],[-122.589850,-3.972660],[-116.507839,-4.130841],[-113.238290,-4.605470],[-111.577180,-5.466779],[-110.320320,-6.785160],[-109.529331,-8.525371],[-109.265630,-10.652350],[-109.612827,-13.003390],[-110.654300,-14.853520],[-112.328645,-16.158661],[-114.574220,-16.875000],[-122.167970,-17.050780],[-130.289070,-17.050780]]);
    }
  }
}

module poly_path3062(h)
{
  scale([25.4/90, -25.4/90, 1]) union()
  {
    linear_extrude(height=h)
      polygon([[-77.097660,25.769530],[-77.097660,-17.050780],[-92.390630,-17.050780],[-92.390630,-25.769530],[-51.433600,-25.769530],[-51.433600,-17.050780],[-66.691410,-17.050780],[-66.691410,25.769530]]);
  }
}

module poly_path3064(h)
{
  scale([25.4/90, -25.4/90, 1]) union()
  {
    difference()
    {
       linear_extrude(height=h)
         polygon([[-44.648440,25.769530],[-44.648440,-25.769530],[-22.746100,-25.769530],[-15.613801,-25.422325],[-10.740240,-24.380860],[-8.961578,-23.551365],[-7.369666,-22.451626],[-5.964507,-21.081641],[-4.746100,-19.441410],[-3.761749,-17.602275],[-3.058634,-15.635715],[-2.496100,-11.320320],[-2.709262,-8.546250],[-3.348672,-6.024881],[-4.414335,-3.756212],[-5.906250,-1.740240],[-7.822290,-0.025258],[-10.160190,1.340348],[-12.919950,2.356577],[-16.101570,3.023430],[-13.021026,5.088880],[-10.529300,7.347650],[-7.949742,10.617194],[-4.605470,15.714840],[1.687500,25.769530],[-10.757820,25.769530],[-18.281250,14.554680],[-23.765630,6.978510],[-25.286157,5.660166],[-26.894540,4.833980],[-29.030294,4.398935],[-32.132820,4.253900],[-34.242190,4.253900],[-34.242190,25.769530]]);
       translate([0, 0, -fudge])
         linear_extrude(height=h+2*fudge)
           polygon([[-34.242190,-3.972660],[-26.542970,-3.972660],[-20.460962,-4.130841],[-17.191410,-4.605470],[-15.530304,-5.466779],[-14.273440,-6.785160],[-13.482451,-8.525371],[-13.218750,-10.652350],[-13.565949,-13.003390],[-14.607430,-14.853520],[-16.281767,-16.158661],[-18.527350,-16.875000],[-26.121100,-17.050780],[-34.242190,-17.050780]]);
    }
  }
}

module poly_path3068(h)
{
  scale([25.4/90, -25.4/90, 1]) union()
  {
    difference()
    {
       linear_extrude(height=h)
         polygon([[27.316400,25.769530],[27.316400,-25.769530],[44.015620,-25.769530],[51.855441,-25.576135],[56.390620,-24.996100],[58.515355,-24.245704],[60.459928,-23.154751],[62.224338,-21.723240],[63.808590,-19.951170],[65.115937,-17.867044],[66.049768,-15.499485],[66.610079,-12.848494],[66.796870,-9.914070],[66.366175,-5.545880],[65.074210,-1.933600],[63.118614,0.953630],[60.697260,3.146480],[58.020965,4.680186],[55.300780,5.589840],[50.739233,6.143566],[44.507810,6.328120],[37.722650,6.328120],[37.722650,25.769530]]);
       translate([0, 0, -fudge])
         linear_extrude(height=h+2*fudge)
           polygon([[37.722650,-17.050780],[37.722650,-2.425780],[43.417960,-2.425780],[48.550758,-2.627914],[51.644530,-3.234380],[53.494601,-4.271465],[54.896480,-5.765630],[55.779754,-7.628884],[56.074210,-9.773440],[55.661103,-12.339819],[54.421870,-14.414070],[52.549780,-15.899384],[50.238280,-16.699220],[42.750000,-17.050780]]);
    }
  }
}

module poly_path3070(h)
{
  scale([25.4/90, -25.4/90, 1]) union()
  {
    difference()
    {
       linear_extrude(height=h)
         polygon([[75.410150,25.769530],[75.410150,-25.769530],[92.109370,-25.769530],[99.949191,-25.576135],[104.484370,-24.996100],[106.609105,-24.245704],[108.553678,-23.154751],[110.318088,-21.723240],[111.902340,-19.951170],[113.209687,-17.867044],[114.143518,-15.499485],[114.703829,-12.848494],[114.890620,-9.914070],[114.459925,-5.545880],[113.167960,-1.933600],[111.212364,0.953630],[108.791010,3.146480],[106.114715,4.680186],[103.394530,5.589840],[98.832983,6.143566],[92.601560,6.328120],[85.816400,6.328120],[85.816400,25.769530]]);
       translate([0, 0, -fudge])
         linear_extrude(height=h+2*fudge)
           polygon([[85.816400,-17.050780],[85.816400,-2.425780],[91.511710,-2.425780],[96.644508,-2.627914],[99.738280,-3.234380],[101.588351,-4.271465],[102.990230,-5.765630],[103.873504,-7.628884],[104.167960,-9.773440],[103.754853,-12.339819],[102.515620,-14.414070],[100.643530,-15.899384],[98.332030,-16.699220],[90.843750,-17.050780]]);
    }
  }
}

module poly_path3072(h)
{
  scale([25.4/90, -25.4/90, 1]) union()
  {
    linear_extrude(height=h)
      polygon([[123.503900,25.769530],[123.503900,-25.769530],[161.718750,-25.769530],[161.718750,-17.050780],[133.910150,-17.050780],[133.910150,-5.625000],[159.785150,-5.625000],[159.785150,3.058590],[133.910150,3.058590],[133.910150,17.085930],[162.703120,17.085930],[162.703120,25.769530]]);
  }
}

module airtripper() {
	poly_path3058(2);
	poly_path3066(2);
	poly_path3074(2);
	poly_path3056(2);
	poly_path3060(2);
	poly_path3062(2);
	poly_path3064(2);
	poly_path3068(2);
	poly_path3070(2);
	poly_path3072(2);
}


//##################################################################
//#################### HARDWARE SECTION ############################
//##################################################################


//##################### Load Cell Model ############################


//load_cell();

module load_cell() {
	difference() {
		// Load Cell Bar
		translate([0,0,0]) color("silver") cube([lcl,lcw,lch]);
		// Left side load cell holes
		translate([lchle,lcw/2,-1]) color("silver") cylinder(lch+2, r=lclhs/2, $fn=50);
		translate([lchle+lchln,lcw/2,-1]) color("silver") cylinder(lch+2, r=lclhs/2, $fn=50);
		// Right side load cell holes
		translate([lchle+lchln+lchcd,lcw/2,-1]) color("silver") cylinder(lch+2, r=lcrhs/2, $fn=50);
		translate([lchle+lchln+lchcd+lchrc,lcw/2,-1]) color("silver") cylinder(lch+2, r=lcrhs/2, $fn=50);
	}
}
